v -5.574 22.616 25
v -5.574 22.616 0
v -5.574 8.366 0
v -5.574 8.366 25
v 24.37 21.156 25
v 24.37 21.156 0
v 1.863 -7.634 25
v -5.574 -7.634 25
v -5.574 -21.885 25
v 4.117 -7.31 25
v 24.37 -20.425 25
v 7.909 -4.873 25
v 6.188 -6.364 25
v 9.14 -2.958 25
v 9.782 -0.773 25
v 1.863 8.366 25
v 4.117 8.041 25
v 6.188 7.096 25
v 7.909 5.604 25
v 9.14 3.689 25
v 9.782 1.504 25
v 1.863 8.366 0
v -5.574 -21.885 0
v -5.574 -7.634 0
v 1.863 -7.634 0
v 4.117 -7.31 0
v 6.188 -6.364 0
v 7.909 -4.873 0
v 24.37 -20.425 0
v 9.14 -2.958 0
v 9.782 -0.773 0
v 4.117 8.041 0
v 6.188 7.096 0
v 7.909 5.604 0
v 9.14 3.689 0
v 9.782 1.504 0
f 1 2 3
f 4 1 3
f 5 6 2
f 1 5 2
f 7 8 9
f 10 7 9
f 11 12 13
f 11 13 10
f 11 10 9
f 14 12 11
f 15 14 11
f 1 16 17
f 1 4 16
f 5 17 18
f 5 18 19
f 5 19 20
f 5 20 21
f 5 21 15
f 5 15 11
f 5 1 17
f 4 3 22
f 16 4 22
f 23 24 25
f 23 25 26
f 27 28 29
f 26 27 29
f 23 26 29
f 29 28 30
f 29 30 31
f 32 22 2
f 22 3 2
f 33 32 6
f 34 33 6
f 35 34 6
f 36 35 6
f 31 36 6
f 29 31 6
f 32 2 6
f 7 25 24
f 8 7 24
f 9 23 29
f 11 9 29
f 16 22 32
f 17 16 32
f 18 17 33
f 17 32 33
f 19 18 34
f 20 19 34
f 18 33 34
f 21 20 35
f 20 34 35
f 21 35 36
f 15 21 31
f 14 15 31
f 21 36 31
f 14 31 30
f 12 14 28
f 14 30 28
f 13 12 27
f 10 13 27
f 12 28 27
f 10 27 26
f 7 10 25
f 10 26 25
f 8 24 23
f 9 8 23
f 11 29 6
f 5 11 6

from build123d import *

# Parameters (mm, degrees)
F1_DEPTH = 25


with BuildPart() as f1:
    # F0 (on Top) → F1 (new body)
    with BuildSketch(Plane.XY):
        with BuildLine():
            ThreePointArc((1.863135, 8.365539), (9.863135, 0.365539), (1.863135, -7.634461))
            Line((1.863135, -7.634461), (-5.573545, -7.634461))
            Line((-5.573545, -7.634461), (-5.573545, -21.884736))
            Line((-5.573545, -21.884736), (24.369754, -20.425071))
            Line((24.369754, -20.425071), (24.369754, 21.156149))
            Line((24.369754, 21.156149), (-5.573545, 22.615814))
            Line((-5.573545, 22.615814), (-5.573545, 8.365539))
            Line((-5.573545, 8.365539), (1.863135, 8.365539))
        make_face()
    extrude(amount=F1_DEPTH)


solid = f1.part
